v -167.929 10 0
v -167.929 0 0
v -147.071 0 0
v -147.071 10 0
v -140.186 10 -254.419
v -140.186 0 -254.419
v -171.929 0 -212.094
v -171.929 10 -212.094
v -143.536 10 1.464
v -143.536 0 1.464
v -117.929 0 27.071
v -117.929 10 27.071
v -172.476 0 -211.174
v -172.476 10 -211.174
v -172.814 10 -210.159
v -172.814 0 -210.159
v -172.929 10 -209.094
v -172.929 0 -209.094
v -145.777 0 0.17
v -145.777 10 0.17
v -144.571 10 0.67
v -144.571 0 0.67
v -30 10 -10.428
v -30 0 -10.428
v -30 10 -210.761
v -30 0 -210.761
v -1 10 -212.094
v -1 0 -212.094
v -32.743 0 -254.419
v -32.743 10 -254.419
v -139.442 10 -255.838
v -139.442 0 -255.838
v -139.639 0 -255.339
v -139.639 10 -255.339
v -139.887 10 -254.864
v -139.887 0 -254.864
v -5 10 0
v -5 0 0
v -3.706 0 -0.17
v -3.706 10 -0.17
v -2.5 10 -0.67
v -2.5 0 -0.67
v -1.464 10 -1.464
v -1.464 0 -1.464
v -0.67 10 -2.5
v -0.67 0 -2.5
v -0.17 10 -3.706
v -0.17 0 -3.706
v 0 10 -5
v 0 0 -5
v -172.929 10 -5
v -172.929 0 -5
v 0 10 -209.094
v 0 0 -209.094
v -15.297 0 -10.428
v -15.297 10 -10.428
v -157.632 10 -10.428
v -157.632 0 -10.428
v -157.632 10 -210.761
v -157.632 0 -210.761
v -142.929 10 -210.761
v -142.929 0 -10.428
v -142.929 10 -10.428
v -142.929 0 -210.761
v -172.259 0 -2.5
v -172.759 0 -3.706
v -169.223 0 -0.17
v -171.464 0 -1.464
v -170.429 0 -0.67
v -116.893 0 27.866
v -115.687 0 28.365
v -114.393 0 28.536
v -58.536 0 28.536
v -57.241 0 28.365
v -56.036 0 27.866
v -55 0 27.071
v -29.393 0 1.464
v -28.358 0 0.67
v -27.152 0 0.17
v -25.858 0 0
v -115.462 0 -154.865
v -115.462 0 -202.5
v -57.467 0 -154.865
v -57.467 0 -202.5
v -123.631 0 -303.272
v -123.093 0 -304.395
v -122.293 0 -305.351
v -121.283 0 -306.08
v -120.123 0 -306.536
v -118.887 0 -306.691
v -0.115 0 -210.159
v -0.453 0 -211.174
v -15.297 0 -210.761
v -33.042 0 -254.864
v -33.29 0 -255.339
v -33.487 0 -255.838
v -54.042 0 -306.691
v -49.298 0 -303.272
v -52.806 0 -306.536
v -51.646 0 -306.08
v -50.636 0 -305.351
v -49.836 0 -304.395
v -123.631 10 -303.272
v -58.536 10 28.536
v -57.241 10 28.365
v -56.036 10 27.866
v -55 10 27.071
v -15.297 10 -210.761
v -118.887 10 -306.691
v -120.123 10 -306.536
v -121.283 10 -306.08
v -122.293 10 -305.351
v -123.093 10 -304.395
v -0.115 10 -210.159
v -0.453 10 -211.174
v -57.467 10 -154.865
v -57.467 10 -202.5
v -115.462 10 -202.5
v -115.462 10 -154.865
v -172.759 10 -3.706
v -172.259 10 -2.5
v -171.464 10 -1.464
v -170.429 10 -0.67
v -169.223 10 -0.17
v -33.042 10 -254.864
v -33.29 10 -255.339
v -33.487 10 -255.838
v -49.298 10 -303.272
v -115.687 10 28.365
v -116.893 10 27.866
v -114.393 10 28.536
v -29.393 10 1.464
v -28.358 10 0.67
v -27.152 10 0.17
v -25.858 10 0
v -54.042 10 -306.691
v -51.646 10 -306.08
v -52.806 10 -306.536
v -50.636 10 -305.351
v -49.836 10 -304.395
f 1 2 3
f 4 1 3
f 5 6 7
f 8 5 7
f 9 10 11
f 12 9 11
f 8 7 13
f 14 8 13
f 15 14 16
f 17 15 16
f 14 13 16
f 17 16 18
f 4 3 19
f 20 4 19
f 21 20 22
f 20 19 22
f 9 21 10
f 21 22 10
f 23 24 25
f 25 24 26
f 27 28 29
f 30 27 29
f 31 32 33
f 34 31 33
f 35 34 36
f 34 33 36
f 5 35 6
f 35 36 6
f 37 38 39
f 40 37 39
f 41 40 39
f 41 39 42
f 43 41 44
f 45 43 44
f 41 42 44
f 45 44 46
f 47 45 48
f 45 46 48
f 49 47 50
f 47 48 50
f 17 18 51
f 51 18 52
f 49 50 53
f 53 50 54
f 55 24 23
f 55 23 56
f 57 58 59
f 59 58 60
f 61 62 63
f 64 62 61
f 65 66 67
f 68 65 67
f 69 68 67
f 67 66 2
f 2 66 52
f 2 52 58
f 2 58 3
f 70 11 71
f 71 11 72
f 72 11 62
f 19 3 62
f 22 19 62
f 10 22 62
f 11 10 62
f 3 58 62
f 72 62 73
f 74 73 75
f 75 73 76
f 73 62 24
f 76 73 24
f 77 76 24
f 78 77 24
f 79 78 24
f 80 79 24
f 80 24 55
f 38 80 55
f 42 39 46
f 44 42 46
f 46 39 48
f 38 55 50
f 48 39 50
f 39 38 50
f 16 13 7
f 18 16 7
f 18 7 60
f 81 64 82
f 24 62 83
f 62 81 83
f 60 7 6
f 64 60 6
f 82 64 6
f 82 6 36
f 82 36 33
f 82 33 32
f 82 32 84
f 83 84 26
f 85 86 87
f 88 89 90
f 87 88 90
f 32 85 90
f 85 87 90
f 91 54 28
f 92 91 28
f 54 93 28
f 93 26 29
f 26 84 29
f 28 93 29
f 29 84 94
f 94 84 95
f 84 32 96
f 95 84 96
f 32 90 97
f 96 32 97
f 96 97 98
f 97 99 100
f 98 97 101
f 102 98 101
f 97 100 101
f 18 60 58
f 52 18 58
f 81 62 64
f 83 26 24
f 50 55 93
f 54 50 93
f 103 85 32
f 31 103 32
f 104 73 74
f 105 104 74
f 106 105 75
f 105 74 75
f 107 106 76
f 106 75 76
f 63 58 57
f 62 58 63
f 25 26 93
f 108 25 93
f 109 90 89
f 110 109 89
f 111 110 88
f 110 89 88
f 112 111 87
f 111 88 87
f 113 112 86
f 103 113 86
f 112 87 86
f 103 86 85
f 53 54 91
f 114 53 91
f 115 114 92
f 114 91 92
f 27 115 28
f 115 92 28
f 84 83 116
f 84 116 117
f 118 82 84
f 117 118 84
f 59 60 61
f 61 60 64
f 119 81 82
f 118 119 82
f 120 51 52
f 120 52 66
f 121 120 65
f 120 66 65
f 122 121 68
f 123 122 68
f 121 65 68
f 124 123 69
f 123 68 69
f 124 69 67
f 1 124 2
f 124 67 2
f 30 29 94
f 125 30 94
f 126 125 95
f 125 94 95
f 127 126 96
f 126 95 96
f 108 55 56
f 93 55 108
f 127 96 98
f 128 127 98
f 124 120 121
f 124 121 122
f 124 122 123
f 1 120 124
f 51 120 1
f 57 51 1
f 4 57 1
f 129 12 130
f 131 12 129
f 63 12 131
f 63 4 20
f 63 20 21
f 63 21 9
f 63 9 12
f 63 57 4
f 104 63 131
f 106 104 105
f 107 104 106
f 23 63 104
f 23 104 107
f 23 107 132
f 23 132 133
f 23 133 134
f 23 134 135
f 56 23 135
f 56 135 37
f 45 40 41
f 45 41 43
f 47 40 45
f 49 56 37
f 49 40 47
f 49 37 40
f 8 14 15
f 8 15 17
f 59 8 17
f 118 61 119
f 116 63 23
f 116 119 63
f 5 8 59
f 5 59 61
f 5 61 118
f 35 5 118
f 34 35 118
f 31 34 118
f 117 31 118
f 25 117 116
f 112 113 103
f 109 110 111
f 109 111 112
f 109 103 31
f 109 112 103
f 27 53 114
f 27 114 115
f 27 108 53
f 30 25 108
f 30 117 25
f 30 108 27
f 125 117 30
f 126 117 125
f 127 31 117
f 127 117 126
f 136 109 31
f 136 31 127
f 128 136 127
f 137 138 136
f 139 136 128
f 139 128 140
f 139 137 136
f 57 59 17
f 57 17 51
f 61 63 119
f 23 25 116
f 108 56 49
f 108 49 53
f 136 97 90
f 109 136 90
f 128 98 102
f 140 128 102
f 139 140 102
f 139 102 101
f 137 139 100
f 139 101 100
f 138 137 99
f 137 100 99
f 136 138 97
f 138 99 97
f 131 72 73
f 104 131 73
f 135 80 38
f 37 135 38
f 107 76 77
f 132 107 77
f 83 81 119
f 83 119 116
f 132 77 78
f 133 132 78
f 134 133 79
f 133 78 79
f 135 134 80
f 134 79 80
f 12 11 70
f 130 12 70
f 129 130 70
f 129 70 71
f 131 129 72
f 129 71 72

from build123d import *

# Parameters (mm, degrees)
SKETCH1_W           = 14.703470952
SKETCH1_H           = 200.333333333
SKETCH1_W_2         = 57.995054435
SKETCH1_H_2         = 47.634748305
BOSS_EXTRUDE1_DEPTH = 10


with BuildPart() as part:
    # Sketch1 → Boss-Extrude1 (new body)
    with BuildSketch(Plane(origin=(0, 0, 0), x_dir=(1, 0, 0), z_dir=(0, 1, 0))):
        with BuildLine():
            Line((0, 5), (0, 209.09430585))
            ThreePointArc((0, 209.09430585), (-0.25658351, 210.67544468), (-1, 212.09430585))
            Line((-1, 212.09430585), (-32.74341649, 254.41886117))
            ThreePointArc((-32.74341649, 254.41886117), (-33.17231305, 255.098327769), (-33.486832981, 255.83772234))
            Line((-33.486832981, 255.83772234), (-49.298221281, 303.271887242))
            ThreePointArc((-49.298221281, 303.271887242), (-51.118086348, 305.746959338), (-54.041637772, 306.690748412))
            Line((-54.041637772, 306.690748412), (-118.887294417, 306.690748412))
            ThreePointArc((-118.887294417, 306.690748412), (-121.81084584, 305.746959338), (-123.630710907, 303.271887242))
            Line((-123.630710907, 303.271887242), (-139.442099208, 255.83772234))
            ThreePointArc((-139.442099208, 255.83772234), (-139.756619138, 255.098327769), (-140.185515698, 254.41886117))
            Line((-140.185515698, 254.41886117), (-171.928932188, 212.09430585))
            ThreePointArc((-171.928932188, 212.09430585), (-172.672348678, 210.67544468), (-172.928932188, 209.09430585))
            Line((-172.928932188, 209.09430585), (-172.928932188, 5))
            ThreePointArc((-172.928932188, 5), (-171.464466094, 1.464466094), (-167.928932188, 0))
            Line((-167.928932188, 0), (-147.071067812, 0))
            ThreePointArc((-147.071067812, 0), (-145.15765065, -0.380602337), (-143.535533906, -1.464466094))
            Line((-143.535533906, -1.464466094), (-117.928932188, -27.071067812))
            ThreePointArc((-117.928932188, -27.071067812), (-116.306815444, -28.154931568), (-114.393398282, -28.535533906))
            Line((-114.393398282, -28.535533906), (-58.535533906, -28.535533906))
            ThreePointArc((-58.535533906, -28.535533906), (-56.622116744, -28.154931568), (-55, -27.071067812))
            Line((-55, -27.071067812), (-29.393398282, -1.464466094))
            ThreePointArc((-29.393398282, -1.464466094), (-27.771281538, -0.380602337), (-25.857864376, 0))
            Line((-25.857864376, 0), (-5, 0))
            ThreePointArc((-5, 0), (-1.464466094, 1.464466094), (0, 5))
        make_face()
        with Locations((-22.648264524, 110.59430585)):
            Rectangle(SKETCH1_W, SKETCH1_H, mode=Mode.SUBTRACT)
        with Locations((-150.280667664, 110.59430585)):
            Rectangle(SKETCH1_W, SKETCH1_H, mode=Mode.SUBTRACT)
        with Locations((-86.464466095, 178.682625847)):
            Rectangle(SKETCH1_W_2, SKETCH1_H_2, mode=Mode.SUBTRACT)
    extrude(amount=BOSS_EXTRUDE1_DEPTH)


solid = part.part
